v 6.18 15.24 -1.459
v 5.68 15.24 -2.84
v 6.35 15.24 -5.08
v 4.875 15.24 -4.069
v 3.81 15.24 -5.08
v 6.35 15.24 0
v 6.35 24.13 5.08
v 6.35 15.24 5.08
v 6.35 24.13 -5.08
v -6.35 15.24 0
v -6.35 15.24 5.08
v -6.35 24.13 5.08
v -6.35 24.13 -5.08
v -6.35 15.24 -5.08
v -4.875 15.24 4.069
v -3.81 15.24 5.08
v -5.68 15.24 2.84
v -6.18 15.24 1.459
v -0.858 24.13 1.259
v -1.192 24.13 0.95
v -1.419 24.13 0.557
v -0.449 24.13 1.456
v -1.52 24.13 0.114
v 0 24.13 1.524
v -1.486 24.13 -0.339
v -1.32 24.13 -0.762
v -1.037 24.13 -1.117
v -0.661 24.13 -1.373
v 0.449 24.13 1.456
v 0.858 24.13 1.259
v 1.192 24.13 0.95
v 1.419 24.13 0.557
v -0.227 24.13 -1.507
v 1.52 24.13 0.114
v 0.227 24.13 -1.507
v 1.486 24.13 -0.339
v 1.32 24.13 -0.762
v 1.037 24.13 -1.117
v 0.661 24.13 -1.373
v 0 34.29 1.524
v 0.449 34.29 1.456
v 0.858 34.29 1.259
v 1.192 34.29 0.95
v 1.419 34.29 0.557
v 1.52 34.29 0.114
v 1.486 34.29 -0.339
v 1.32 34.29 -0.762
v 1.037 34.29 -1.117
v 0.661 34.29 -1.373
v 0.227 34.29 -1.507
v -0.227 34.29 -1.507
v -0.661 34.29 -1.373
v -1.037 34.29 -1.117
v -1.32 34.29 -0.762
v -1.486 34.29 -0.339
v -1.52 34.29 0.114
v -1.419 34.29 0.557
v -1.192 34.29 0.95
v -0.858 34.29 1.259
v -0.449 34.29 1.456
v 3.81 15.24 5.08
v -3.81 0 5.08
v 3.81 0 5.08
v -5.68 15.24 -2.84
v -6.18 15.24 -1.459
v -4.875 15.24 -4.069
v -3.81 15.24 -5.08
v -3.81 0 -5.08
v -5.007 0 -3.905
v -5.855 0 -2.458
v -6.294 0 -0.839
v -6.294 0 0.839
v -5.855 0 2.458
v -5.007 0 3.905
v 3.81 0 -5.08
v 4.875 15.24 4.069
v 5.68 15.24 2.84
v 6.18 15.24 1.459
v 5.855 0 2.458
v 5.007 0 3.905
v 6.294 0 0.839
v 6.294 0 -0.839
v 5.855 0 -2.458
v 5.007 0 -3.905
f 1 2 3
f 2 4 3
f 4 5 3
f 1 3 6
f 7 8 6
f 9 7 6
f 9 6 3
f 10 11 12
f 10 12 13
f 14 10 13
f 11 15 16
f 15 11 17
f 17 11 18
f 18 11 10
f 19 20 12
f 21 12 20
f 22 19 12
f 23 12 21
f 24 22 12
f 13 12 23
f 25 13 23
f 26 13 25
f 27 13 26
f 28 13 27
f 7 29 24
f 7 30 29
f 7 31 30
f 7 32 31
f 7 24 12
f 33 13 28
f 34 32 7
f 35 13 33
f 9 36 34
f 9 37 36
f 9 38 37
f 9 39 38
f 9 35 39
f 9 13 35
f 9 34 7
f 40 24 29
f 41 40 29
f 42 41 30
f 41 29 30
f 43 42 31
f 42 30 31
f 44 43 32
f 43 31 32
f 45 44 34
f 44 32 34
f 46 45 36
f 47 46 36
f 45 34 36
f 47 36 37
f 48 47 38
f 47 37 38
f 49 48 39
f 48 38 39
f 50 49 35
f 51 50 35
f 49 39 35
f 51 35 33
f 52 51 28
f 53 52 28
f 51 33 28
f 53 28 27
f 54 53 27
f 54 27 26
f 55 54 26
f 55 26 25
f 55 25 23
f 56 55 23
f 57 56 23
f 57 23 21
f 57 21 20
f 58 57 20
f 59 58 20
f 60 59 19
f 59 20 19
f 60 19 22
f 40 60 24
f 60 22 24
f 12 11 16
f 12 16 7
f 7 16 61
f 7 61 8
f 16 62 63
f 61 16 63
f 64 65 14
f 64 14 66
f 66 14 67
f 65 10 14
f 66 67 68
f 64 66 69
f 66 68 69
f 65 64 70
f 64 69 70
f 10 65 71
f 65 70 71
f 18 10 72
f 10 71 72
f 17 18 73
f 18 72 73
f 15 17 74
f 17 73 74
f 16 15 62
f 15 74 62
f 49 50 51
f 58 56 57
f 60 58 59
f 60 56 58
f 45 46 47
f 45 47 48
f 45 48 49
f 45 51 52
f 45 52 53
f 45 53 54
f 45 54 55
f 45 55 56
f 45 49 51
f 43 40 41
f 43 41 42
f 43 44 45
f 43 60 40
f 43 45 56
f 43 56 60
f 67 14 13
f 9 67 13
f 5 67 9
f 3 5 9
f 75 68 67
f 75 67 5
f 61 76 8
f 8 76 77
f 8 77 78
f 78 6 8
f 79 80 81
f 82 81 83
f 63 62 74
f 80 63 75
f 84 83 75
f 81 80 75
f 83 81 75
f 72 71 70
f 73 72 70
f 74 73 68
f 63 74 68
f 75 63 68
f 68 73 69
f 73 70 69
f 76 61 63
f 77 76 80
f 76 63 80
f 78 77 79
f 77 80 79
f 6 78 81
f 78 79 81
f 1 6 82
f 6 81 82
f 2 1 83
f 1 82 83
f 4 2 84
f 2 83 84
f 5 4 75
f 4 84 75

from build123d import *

# Parameters (mm, degrees)
SKETCH1_R           = 6.35
BOSS_EXTRUDE1_DEPTH = 15.24
SKETCH3_W           = 12.7
SKETCH3_H           = 10.16
BOSS_EXTRUDE2_DEPTH = 8.89
CUT_EXTRUDE2_DEPTH  = 26.746881365
SKETCH5_R           = 1.524
BOSS_EXTRUDE3_DEPTH = 10.16


with BuildPart() as part:
    # Sketch1 → Boss-Extrude1 (new body)
    with BuildSketch(Plane(origin=(0, 0, 0), x_dir=(1, 0, 0), z_dir=(0, 1, 0))):
        with Locations(Location((0, 0, 0), (0, 0, 90))):
            Circle(SKETCH1_R)
    extrude(amount=BOSS_EXTRUDE1_DEPTH)

    # Sketch3 → Boss-Extrude2 (add)
    with BuildSketch(Plane(origin=(0, 15.24, 0), x_dir=(1, 0, 0), z_dir=(0, 1, 0))):
        Rectangle(SKETCH3_W, SKETCH3_H)
    extrude(amount=BOSS_EXTRUDE2_DEPTH)

    # Sketch4 → Cut-Extrude2 (cut, through all)
    with BuildSketch(Plane(origin=(0, 24.13, 0), x_dir=(1, 0, 0), z_dir=(0, 1, 0))):
        with BuildLine():
            ThreePointArc((3.81, 5.08), (0, 6.35), (-3.81, 5.08))
            Line((-3.81, 5.08), (3.81, 5.08))
        make_face()
        with BuildLine():
            Line((3.81, -5.08), (-3.81, -5.08))
            ThreePointArc((-3.81, -5.08), (0, -6.35), (3.81, -5.08))
        make_face()
    extrude(amount=-CUT_EXTRUDE2_DEPTH, mode=Mode.SUBTRACT)

    # Sketch5 → Boss-Extrude3 (add)
    with BuildSketch(Plane(origin=(0, 24.13, 0), x_dir=(1, 0, 0), z_dir=(0, 1, 0))):
        with Locations(Location((0, 0, 0), (0, 0, 270))):
            Circle(SKETCH5_R)
    extrude(amount=BOSS_EXTRUDE3_DEPTH)


solid = part.part
